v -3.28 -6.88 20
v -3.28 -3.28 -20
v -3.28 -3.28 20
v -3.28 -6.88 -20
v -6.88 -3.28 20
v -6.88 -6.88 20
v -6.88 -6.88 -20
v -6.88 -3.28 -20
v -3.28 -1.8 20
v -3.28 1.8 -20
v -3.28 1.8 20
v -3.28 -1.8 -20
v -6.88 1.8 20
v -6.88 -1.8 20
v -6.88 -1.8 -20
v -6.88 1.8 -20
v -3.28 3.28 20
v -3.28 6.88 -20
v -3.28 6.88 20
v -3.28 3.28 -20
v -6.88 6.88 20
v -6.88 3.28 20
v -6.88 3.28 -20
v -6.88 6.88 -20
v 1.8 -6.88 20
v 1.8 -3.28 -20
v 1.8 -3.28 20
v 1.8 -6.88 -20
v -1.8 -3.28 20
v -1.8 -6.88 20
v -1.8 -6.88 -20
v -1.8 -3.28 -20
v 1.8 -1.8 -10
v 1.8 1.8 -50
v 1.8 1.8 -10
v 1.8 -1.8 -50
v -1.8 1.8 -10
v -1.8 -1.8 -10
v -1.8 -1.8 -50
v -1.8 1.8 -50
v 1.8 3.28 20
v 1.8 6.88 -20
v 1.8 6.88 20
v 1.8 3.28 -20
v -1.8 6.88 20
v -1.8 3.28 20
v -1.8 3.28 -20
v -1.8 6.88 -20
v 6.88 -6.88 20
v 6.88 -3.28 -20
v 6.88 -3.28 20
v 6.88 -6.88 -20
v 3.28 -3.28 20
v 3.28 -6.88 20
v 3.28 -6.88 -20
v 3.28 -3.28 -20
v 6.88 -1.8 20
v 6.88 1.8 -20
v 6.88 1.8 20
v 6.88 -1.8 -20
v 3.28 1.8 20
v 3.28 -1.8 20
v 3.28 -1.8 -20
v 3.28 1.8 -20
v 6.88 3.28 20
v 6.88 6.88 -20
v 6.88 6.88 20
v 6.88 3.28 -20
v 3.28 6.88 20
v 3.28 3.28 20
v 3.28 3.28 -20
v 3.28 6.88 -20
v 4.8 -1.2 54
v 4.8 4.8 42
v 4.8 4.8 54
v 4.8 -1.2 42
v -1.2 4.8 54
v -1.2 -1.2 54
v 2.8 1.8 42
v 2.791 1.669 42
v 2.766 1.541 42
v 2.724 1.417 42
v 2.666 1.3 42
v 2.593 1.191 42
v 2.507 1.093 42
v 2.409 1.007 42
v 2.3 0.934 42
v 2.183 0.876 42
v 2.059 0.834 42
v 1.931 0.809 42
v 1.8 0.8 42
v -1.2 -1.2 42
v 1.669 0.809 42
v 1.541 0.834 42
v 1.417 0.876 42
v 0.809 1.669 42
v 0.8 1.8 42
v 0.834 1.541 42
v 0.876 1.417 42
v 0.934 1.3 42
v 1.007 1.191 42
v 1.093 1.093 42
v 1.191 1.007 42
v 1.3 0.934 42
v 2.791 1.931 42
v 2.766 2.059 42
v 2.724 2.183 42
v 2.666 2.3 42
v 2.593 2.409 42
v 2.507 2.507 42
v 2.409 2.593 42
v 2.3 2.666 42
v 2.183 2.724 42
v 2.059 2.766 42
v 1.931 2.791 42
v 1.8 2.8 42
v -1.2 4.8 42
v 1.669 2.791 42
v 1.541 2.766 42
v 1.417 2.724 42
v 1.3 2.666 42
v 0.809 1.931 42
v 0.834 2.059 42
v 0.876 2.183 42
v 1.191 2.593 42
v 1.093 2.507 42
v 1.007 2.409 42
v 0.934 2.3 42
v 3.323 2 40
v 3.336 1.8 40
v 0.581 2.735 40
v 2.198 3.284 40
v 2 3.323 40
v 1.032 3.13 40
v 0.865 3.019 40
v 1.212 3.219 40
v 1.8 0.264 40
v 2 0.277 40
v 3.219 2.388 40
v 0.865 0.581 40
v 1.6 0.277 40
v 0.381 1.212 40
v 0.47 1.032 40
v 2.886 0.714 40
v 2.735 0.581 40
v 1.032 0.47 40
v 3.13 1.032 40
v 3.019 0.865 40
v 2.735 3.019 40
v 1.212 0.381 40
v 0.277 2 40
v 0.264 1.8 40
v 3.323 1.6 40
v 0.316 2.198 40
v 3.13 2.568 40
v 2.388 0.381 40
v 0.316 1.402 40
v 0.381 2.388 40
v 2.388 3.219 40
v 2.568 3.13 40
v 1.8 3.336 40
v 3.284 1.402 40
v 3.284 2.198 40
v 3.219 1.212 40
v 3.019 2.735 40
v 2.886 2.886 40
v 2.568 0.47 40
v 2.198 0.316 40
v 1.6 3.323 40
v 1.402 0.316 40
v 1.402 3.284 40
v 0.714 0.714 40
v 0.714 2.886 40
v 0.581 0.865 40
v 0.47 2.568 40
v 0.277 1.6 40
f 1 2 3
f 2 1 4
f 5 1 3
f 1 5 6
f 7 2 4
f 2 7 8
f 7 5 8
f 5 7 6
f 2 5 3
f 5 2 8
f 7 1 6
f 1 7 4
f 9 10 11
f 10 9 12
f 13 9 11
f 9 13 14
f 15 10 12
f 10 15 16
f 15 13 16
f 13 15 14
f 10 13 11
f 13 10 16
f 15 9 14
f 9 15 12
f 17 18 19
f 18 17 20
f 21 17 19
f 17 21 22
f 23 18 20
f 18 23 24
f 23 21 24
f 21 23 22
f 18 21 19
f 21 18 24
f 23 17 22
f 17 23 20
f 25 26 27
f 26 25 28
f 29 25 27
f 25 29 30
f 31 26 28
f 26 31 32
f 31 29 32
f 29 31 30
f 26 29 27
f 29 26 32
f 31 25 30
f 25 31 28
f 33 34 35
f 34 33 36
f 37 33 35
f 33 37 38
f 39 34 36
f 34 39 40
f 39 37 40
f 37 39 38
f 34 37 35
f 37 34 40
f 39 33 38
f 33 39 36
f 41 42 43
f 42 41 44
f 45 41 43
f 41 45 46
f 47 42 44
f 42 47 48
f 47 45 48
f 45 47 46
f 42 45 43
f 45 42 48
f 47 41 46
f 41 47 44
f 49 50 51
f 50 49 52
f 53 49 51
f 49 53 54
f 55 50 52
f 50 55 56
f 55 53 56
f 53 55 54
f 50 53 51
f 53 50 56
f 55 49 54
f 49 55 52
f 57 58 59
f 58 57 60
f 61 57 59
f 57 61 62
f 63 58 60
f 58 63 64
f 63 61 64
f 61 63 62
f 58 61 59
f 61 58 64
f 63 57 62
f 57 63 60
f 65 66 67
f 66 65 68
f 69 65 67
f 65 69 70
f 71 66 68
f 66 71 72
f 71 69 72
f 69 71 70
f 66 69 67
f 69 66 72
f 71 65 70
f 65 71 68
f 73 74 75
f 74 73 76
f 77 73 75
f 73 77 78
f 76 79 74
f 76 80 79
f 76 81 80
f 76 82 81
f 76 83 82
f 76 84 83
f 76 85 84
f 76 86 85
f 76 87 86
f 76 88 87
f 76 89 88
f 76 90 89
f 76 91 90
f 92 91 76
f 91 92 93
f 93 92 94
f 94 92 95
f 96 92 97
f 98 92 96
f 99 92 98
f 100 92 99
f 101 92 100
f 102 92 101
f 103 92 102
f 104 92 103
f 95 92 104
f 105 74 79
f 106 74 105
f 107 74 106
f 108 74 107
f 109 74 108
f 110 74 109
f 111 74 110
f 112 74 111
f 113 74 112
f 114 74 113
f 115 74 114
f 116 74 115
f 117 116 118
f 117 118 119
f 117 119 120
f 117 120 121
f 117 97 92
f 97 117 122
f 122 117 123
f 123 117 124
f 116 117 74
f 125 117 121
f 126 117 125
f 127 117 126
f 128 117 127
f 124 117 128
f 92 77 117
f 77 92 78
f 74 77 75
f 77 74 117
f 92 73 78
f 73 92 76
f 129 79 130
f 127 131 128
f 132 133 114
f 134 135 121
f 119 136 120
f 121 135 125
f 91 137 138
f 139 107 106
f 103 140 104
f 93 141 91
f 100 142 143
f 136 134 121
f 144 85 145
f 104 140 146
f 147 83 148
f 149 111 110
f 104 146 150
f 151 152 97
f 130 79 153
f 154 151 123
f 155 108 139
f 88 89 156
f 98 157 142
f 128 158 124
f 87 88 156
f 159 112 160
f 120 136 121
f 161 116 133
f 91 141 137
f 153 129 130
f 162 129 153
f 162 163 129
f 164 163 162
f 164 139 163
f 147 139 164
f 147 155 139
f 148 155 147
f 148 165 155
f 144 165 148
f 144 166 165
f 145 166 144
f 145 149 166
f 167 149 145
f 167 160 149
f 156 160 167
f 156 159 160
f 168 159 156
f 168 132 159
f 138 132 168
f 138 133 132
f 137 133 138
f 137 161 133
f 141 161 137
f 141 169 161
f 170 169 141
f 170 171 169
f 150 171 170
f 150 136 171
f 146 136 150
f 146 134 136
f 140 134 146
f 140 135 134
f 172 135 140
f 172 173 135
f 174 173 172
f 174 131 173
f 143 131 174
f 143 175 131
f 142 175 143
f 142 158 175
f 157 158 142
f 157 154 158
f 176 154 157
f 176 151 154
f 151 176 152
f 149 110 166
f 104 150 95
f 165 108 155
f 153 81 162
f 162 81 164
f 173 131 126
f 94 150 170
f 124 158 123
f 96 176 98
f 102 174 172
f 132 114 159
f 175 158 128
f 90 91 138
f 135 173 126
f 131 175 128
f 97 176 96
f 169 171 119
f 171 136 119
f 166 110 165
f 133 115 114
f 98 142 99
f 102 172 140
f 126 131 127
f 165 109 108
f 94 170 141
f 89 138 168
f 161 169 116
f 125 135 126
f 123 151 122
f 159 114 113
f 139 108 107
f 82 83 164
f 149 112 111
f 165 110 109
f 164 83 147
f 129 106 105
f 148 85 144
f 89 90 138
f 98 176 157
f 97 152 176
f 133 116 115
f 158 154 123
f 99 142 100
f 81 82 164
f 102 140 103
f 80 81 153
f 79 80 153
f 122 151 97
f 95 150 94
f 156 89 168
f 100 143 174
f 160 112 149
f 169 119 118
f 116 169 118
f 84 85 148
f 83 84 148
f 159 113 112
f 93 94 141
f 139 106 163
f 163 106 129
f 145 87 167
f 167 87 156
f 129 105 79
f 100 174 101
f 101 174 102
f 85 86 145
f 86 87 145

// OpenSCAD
// DND-111 — A1 reader-head optical geometry at the 5.08 mm pitch (real OpenSCAD)
//
// Bounds the SINGLE-CELL READ RESOLUTION question from CAD + geometry:
// can one wrong cell among 6,400 be distinguished from its neighbours?
//
// The reader head sits above the column tops at a working gap g. A single
// interrogation aperture of diameter d emits at half-angle theta. The
// returned spot must land ENTIRELY on the target column top face so a
// neighbour's light does not contaminate the reading. This file renders the
// worst case: the aperture centred on a CELL CORNER (max straddle), so the
// spot's reach past the top face into the 0.74 mm owned lane is visible.
//
// EVIDENCE CLASS: CAD geometry only. No print, no measurement (DND-27).
//
// Geometry taken from the placed cell CAD (a1_binary_latch_cell.scad):
//   PITCH = 5.08, BODY (column top face) = 3.60, lane = 0.74 each side.

PITCH      = 5.08;
BODY       = 3.60;         // column top face (square)
TRAVEL     = 40.0;         // column top at full up = 40 mm
OWNED_LANE = PITCH/2 - BODY/2;   // 0.74 mm

WORK_GAP   = 2.0;          // reader-to-column-top working gap (assumption-class)
APERTURE   = 2.0;          // single-cell interrogation aperture (assumption-class)
HALF_ANGLE = 15.0;         // emission half-angle (deg)
$fn = 48;

// Spot diameter where the center ray meets the target plane:
//   spot = aperture + 2 * gap * tan(half_angle)
function spot_d(gap, d, ha) = d + 2*gap*tan(ha);
SPOT = spot_d(WORK_GAP, APERTURE, HALF_ANGLE);

// Worst-case aperture position: at a cell corner -> spot reaches sqrt(2) times
// further diagonally. Required: the diagonal reach must stay on the top face.
CORNER_REACH = SPOT/2 * sqrt(2);

module column_up() {
    // a raised column: top face at z = TRAVEL
    color("SteelBlue")
        translate([0, 0, TRAVEL/2 - 20])
            cube([BODY, BODY, TRAVEL], center=true);
}

module column_down() {
    // a retracted column: top face near the base (z = 0)
    color("DimGray")
        translate([0, 0, -10 - 20])
            cube([BODY, BODY, TRAVEL], center=true);
}

module reader_head() {
    // the reader head body (orange) with the interrogation aperture (yellow)
    translate([0, 0, TRAVEL + WORK_GAP + 6])
        color("Orange") cube([APERTURE + 4, APERTURE + 4, 12], center=true);
    // the cone from the aperture to the target top face
    translate([0, 0, TRAVEL + WORK_GAP/2])
        color("Gold", 0.35)
            cylinder(h = WORK_GAP, d1 = SPOT, d2 = APERTURE, center=true);
}

module neighbour_patch() {
    // a 3x3 patch with the CENTRE cell DOWN (the wrong cell) and neighbours UP,
    // to show that a single-cell read only sees the centre column's top face.
    for (i = [-1, 0, 1])
        for (j = [-1, 0, 1]) {
            x = i*PITCH; y = j*PITCH;
            if (i == 0 && j == 0) translate([x, y, 0]) column_down();
            else translate([x, y, 0]) column_up();
        }
}

module assembly() {
    neighbour_patch();
    // aperture centred over the CENTRE cell corner (worst-case straddle)
    translate([BODY/2, BODY/2, 0]) reader_head();
}

assembly();

// ---- self-checks (echoed, captured by the render tool) ---------------------
echo(str("PITCH=", PITCH, " BODY=", BODY, " OWNED_LANE=", OWNED_LANE));
echo(str("WORK_GAP=", WORK_GAP, " APERTURE=", APERTURE, " HALF_ANGLE=", HALF_ANGLE));
echo(str("SPOT_diameter=", SPOT));
echo(str("CORNER_REACH=", CORNER_REACH, " vs BODY/2=", BODY/2));
echo(str("spot fits top face at centre: ", (SPOT/2) <= BODY/2));
echo(str("spot fits top face at corner: ", CORNER_REACH <= BODY/2));
echo(str("gap for centre fit: ", (BODY - APERTURE)/(2*tan(HALF_ANGLE))));
